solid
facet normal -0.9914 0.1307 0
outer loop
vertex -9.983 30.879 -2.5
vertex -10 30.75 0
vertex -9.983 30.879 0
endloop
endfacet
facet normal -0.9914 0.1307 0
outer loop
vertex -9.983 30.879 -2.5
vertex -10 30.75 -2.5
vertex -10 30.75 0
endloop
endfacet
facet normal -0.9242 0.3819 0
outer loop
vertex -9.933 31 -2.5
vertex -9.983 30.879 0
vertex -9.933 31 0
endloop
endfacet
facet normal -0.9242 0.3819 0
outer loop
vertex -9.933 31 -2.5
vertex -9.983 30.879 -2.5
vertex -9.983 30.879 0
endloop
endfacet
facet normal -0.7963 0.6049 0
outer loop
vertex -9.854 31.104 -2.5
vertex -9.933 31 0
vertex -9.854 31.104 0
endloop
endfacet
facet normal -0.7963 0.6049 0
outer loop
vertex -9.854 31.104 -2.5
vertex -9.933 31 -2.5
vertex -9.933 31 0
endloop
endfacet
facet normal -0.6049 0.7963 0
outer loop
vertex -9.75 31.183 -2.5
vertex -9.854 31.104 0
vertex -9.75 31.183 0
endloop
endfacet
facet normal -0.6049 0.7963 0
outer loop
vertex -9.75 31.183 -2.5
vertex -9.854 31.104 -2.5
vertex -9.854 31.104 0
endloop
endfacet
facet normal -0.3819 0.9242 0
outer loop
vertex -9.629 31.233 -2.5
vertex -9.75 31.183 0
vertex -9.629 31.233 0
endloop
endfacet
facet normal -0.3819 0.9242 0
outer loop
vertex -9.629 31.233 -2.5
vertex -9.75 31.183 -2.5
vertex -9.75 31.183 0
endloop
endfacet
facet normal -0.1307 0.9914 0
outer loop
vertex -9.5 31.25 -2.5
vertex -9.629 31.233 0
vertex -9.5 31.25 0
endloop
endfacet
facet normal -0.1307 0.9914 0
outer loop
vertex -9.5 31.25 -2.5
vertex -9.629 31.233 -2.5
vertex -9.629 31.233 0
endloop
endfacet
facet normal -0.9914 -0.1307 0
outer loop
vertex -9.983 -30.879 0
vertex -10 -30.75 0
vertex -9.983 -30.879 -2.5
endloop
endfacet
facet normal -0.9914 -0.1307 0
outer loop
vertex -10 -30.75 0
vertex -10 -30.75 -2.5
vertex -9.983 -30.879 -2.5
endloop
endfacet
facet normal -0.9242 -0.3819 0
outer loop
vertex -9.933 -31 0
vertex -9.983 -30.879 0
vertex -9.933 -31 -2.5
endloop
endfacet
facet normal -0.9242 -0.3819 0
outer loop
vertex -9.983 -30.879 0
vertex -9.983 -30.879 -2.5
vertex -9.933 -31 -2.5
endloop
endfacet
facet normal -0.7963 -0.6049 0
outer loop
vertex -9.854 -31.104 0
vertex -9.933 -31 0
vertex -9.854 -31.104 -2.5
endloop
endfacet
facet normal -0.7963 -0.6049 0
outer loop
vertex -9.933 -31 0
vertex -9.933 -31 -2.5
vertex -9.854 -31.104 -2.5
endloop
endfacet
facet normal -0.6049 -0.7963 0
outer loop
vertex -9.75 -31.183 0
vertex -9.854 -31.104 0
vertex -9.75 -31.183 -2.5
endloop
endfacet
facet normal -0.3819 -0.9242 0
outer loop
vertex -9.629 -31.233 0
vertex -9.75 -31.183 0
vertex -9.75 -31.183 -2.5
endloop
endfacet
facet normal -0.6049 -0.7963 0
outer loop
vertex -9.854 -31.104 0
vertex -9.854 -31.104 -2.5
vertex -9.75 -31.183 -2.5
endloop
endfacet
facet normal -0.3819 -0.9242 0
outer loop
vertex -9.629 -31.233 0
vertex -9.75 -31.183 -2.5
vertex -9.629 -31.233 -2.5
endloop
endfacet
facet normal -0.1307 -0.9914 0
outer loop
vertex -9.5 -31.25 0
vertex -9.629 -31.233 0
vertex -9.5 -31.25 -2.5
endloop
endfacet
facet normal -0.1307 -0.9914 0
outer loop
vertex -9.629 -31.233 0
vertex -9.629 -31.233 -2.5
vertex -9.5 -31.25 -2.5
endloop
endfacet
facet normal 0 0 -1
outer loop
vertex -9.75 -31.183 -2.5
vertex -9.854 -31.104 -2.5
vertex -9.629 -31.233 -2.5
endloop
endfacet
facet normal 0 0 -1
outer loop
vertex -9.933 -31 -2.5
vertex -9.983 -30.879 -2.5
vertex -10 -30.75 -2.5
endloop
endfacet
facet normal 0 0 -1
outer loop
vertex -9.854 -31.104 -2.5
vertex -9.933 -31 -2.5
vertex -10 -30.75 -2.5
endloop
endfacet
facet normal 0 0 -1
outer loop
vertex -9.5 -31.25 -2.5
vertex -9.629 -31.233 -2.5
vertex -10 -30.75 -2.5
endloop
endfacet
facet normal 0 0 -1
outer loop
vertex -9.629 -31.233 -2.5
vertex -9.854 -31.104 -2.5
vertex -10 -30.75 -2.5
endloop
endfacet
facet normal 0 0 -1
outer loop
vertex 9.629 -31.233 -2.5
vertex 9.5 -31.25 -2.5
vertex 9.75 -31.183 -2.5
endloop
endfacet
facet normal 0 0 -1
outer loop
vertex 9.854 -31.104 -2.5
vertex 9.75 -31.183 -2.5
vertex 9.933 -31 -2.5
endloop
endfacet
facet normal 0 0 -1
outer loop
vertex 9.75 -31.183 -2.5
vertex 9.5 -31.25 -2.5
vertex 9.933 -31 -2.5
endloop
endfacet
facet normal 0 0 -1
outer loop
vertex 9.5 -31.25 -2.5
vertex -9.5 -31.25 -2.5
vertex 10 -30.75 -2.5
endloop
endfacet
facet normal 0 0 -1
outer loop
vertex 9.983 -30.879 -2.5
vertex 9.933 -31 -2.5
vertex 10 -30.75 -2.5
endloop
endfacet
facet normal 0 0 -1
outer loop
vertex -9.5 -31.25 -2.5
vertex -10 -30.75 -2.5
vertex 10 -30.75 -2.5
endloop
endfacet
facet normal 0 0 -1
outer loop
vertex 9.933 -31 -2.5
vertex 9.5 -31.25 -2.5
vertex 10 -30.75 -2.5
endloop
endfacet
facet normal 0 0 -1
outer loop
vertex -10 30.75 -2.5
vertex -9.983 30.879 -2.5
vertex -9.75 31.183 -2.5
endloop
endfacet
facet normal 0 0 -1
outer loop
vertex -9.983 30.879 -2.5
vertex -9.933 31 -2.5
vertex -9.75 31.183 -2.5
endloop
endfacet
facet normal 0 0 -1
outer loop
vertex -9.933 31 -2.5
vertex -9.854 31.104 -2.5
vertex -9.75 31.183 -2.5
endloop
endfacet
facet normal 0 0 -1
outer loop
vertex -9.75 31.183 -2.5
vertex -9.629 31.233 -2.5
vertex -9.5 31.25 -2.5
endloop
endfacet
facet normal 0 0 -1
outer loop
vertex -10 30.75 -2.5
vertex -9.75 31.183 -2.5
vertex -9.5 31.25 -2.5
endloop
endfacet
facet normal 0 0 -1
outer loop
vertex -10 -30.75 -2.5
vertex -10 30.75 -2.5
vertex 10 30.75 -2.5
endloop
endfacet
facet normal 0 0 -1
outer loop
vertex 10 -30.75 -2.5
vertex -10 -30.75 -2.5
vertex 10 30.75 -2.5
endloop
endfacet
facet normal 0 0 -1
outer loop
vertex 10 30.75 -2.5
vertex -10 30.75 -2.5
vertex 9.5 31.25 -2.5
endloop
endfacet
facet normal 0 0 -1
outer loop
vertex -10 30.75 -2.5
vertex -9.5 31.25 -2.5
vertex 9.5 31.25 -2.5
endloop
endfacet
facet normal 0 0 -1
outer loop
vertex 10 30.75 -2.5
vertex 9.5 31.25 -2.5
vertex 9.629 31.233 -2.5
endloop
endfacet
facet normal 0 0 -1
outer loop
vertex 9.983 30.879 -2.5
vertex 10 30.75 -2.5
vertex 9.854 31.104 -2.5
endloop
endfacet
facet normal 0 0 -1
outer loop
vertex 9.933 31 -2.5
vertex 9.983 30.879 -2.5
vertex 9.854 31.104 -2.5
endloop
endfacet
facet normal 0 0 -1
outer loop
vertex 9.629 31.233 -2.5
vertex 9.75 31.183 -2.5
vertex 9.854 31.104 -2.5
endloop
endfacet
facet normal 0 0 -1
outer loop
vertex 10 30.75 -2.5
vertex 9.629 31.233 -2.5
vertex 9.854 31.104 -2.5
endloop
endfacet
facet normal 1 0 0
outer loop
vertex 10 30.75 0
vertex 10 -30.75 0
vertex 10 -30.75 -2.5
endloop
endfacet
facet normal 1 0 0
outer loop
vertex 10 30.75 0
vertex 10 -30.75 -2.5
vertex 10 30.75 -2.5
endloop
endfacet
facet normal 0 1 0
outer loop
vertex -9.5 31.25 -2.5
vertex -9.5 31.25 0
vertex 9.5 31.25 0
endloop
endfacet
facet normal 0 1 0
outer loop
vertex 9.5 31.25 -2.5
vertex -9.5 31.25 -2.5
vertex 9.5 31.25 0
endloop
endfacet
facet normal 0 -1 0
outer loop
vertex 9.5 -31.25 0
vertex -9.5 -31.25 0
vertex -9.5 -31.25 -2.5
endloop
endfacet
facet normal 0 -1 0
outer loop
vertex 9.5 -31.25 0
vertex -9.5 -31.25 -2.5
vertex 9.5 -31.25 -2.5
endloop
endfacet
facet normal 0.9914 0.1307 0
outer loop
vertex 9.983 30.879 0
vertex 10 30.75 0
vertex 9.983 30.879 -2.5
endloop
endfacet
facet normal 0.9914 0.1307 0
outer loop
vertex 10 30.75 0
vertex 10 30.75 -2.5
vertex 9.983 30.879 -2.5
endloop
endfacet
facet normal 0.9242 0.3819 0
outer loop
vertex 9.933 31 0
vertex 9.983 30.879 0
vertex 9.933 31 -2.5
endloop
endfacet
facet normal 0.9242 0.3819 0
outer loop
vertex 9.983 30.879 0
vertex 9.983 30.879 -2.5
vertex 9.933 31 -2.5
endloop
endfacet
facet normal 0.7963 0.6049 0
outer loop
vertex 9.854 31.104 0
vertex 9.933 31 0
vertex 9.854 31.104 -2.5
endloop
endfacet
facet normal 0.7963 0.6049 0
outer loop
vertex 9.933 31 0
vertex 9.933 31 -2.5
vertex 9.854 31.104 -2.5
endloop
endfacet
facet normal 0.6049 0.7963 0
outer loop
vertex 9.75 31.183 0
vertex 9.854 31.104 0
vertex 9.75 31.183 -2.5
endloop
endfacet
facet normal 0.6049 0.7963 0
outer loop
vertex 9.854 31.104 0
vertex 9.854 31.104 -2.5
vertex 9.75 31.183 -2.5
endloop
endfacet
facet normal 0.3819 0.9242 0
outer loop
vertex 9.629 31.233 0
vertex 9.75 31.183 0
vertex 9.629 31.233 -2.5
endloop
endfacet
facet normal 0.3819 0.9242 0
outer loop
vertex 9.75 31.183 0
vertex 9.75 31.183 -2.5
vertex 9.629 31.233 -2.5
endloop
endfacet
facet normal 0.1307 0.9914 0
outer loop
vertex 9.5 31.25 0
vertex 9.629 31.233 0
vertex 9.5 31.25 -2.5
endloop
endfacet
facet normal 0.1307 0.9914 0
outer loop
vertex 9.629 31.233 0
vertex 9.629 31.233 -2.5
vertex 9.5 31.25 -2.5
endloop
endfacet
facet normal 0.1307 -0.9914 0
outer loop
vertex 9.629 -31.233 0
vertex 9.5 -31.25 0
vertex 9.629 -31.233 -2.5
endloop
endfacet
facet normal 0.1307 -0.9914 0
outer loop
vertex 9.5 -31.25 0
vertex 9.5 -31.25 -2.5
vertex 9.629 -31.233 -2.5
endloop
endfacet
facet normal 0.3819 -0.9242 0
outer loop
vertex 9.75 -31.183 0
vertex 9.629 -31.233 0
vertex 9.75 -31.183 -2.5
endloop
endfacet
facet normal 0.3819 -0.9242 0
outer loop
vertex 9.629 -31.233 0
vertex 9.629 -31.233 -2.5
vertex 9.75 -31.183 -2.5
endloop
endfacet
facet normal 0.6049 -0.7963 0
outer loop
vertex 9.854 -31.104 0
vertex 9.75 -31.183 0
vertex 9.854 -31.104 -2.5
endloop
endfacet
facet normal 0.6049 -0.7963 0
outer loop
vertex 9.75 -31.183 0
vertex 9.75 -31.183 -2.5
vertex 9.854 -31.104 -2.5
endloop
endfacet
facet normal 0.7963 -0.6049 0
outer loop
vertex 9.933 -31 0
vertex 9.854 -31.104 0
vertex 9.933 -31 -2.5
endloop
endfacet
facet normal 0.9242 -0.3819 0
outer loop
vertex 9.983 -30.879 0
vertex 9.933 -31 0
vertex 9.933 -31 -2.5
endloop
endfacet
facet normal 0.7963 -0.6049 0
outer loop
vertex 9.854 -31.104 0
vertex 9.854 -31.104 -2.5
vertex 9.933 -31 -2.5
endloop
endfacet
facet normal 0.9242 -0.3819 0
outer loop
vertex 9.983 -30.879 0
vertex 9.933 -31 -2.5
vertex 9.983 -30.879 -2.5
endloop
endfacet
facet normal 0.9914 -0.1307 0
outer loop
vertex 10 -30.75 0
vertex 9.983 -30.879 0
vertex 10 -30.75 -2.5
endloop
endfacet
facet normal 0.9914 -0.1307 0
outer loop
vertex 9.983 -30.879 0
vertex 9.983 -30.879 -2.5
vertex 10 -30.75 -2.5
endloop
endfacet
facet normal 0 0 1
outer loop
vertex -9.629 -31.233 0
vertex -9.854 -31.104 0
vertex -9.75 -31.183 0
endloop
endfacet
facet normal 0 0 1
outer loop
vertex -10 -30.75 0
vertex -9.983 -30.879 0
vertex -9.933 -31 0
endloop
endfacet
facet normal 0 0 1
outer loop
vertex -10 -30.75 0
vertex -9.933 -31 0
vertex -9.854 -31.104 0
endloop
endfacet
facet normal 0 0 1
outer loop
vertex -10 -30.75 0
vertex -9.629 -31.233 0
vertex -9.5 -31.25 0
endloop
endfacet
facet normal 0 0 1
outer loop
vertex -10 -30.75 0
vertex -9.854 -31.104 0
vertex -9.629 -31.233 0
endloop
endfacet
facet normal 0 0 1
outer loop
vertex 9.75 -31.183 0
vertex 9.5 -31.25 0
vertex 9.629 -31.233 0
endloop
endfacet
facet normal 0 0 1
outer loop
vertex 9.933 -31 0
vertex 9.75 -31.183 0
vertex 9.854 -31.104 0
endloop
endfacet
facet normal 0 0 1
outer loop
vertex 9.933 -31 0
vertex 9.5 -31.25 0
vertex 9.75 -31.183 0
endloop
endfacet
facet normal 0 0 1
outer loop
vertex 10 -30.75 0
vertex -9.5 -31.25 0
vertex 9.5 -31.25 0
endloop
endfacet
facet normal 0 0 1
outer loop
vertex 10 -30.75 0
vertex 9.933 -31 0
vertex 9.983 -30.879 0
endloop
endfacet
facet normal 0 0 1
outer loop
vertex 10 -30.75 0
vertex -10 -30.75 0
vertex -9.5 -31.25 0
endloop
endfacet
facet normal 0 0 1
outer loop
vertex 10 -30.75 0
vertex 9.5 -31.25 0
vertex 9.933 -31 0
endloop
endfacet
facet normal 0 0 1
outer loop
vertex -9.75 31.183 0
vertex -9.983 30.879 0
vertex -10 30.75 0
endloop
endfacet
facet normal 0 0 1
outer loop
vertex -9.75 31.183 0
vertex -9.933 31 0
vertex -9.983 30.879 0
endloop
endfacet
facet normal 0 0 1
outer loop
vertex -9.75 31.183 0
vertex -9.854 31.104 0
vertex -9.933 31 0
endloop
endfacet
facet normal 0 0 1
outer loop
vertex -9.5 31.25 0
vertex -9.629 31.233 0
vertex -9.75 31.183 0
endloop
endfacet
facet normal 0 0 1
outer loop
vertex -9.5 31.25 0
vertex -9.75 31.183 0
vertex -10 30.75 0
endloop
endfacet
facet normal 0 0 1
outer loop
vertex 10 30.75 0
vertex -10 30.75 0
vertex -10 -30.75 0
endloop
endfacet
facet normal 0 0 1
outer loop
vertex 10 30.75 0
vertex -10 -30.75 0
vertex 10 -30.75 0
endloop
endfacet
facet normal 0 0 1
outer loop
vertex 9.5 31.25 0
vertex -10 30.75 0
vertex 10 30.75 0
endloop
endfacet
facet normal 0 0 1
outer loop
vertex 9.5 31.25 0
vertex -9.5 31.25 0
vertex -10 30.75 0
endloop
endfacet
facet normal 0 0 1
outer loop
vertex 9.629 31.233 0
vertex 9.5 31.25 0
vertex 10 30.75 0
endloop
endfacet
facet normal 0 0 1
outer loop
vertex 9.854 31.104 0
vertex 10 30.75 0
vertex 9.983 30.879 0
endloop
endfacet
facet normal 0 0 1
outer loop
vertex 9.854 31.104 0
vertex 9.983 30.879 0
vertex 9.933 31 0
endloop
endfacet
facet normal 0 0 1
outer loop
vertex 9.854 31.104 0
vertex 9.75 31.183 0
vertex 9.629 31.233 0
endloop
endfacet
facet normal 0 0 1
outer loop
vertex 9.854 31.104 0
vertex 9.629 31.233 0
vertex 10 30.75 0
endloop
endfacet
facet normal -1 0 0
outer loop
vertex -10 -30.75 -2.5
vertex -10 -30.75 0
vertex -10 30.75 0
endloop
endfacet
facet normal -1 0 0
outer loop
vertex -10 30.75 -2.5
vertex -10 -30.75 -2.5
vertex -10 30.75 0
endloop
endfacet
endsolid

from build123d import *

# Parameters (mm, degrees)
F0_W     = 40
F0_H     = 125
F1_DEPTH = 5
F2_R     = 1
F3_SCALE = 0.5


with BuildPart() as f1:
    # F0 (on Top) → F1 (new body)
    with BuildSketch(Plane.XY):
        Rectangle(F0_W, F0_H)
    extrude(amount=-F1_DEPTH)

    # F2
    f2_edges = [f1.edges().sort_by_distance(p)[0] for p in [
        (-20, -62.5, -2.5),
        (-20, 62.5, -2.5),
        (20, -62.5, -2.5),
        (20, 62.5, -2.5),
    ]]
    fillet(f2_edges, radius=F2_R)


with BuildPart() as f1_1:
    # F3: moved
    add(f1.part.scale(F3_SCALE))


solid = f1_1.part
